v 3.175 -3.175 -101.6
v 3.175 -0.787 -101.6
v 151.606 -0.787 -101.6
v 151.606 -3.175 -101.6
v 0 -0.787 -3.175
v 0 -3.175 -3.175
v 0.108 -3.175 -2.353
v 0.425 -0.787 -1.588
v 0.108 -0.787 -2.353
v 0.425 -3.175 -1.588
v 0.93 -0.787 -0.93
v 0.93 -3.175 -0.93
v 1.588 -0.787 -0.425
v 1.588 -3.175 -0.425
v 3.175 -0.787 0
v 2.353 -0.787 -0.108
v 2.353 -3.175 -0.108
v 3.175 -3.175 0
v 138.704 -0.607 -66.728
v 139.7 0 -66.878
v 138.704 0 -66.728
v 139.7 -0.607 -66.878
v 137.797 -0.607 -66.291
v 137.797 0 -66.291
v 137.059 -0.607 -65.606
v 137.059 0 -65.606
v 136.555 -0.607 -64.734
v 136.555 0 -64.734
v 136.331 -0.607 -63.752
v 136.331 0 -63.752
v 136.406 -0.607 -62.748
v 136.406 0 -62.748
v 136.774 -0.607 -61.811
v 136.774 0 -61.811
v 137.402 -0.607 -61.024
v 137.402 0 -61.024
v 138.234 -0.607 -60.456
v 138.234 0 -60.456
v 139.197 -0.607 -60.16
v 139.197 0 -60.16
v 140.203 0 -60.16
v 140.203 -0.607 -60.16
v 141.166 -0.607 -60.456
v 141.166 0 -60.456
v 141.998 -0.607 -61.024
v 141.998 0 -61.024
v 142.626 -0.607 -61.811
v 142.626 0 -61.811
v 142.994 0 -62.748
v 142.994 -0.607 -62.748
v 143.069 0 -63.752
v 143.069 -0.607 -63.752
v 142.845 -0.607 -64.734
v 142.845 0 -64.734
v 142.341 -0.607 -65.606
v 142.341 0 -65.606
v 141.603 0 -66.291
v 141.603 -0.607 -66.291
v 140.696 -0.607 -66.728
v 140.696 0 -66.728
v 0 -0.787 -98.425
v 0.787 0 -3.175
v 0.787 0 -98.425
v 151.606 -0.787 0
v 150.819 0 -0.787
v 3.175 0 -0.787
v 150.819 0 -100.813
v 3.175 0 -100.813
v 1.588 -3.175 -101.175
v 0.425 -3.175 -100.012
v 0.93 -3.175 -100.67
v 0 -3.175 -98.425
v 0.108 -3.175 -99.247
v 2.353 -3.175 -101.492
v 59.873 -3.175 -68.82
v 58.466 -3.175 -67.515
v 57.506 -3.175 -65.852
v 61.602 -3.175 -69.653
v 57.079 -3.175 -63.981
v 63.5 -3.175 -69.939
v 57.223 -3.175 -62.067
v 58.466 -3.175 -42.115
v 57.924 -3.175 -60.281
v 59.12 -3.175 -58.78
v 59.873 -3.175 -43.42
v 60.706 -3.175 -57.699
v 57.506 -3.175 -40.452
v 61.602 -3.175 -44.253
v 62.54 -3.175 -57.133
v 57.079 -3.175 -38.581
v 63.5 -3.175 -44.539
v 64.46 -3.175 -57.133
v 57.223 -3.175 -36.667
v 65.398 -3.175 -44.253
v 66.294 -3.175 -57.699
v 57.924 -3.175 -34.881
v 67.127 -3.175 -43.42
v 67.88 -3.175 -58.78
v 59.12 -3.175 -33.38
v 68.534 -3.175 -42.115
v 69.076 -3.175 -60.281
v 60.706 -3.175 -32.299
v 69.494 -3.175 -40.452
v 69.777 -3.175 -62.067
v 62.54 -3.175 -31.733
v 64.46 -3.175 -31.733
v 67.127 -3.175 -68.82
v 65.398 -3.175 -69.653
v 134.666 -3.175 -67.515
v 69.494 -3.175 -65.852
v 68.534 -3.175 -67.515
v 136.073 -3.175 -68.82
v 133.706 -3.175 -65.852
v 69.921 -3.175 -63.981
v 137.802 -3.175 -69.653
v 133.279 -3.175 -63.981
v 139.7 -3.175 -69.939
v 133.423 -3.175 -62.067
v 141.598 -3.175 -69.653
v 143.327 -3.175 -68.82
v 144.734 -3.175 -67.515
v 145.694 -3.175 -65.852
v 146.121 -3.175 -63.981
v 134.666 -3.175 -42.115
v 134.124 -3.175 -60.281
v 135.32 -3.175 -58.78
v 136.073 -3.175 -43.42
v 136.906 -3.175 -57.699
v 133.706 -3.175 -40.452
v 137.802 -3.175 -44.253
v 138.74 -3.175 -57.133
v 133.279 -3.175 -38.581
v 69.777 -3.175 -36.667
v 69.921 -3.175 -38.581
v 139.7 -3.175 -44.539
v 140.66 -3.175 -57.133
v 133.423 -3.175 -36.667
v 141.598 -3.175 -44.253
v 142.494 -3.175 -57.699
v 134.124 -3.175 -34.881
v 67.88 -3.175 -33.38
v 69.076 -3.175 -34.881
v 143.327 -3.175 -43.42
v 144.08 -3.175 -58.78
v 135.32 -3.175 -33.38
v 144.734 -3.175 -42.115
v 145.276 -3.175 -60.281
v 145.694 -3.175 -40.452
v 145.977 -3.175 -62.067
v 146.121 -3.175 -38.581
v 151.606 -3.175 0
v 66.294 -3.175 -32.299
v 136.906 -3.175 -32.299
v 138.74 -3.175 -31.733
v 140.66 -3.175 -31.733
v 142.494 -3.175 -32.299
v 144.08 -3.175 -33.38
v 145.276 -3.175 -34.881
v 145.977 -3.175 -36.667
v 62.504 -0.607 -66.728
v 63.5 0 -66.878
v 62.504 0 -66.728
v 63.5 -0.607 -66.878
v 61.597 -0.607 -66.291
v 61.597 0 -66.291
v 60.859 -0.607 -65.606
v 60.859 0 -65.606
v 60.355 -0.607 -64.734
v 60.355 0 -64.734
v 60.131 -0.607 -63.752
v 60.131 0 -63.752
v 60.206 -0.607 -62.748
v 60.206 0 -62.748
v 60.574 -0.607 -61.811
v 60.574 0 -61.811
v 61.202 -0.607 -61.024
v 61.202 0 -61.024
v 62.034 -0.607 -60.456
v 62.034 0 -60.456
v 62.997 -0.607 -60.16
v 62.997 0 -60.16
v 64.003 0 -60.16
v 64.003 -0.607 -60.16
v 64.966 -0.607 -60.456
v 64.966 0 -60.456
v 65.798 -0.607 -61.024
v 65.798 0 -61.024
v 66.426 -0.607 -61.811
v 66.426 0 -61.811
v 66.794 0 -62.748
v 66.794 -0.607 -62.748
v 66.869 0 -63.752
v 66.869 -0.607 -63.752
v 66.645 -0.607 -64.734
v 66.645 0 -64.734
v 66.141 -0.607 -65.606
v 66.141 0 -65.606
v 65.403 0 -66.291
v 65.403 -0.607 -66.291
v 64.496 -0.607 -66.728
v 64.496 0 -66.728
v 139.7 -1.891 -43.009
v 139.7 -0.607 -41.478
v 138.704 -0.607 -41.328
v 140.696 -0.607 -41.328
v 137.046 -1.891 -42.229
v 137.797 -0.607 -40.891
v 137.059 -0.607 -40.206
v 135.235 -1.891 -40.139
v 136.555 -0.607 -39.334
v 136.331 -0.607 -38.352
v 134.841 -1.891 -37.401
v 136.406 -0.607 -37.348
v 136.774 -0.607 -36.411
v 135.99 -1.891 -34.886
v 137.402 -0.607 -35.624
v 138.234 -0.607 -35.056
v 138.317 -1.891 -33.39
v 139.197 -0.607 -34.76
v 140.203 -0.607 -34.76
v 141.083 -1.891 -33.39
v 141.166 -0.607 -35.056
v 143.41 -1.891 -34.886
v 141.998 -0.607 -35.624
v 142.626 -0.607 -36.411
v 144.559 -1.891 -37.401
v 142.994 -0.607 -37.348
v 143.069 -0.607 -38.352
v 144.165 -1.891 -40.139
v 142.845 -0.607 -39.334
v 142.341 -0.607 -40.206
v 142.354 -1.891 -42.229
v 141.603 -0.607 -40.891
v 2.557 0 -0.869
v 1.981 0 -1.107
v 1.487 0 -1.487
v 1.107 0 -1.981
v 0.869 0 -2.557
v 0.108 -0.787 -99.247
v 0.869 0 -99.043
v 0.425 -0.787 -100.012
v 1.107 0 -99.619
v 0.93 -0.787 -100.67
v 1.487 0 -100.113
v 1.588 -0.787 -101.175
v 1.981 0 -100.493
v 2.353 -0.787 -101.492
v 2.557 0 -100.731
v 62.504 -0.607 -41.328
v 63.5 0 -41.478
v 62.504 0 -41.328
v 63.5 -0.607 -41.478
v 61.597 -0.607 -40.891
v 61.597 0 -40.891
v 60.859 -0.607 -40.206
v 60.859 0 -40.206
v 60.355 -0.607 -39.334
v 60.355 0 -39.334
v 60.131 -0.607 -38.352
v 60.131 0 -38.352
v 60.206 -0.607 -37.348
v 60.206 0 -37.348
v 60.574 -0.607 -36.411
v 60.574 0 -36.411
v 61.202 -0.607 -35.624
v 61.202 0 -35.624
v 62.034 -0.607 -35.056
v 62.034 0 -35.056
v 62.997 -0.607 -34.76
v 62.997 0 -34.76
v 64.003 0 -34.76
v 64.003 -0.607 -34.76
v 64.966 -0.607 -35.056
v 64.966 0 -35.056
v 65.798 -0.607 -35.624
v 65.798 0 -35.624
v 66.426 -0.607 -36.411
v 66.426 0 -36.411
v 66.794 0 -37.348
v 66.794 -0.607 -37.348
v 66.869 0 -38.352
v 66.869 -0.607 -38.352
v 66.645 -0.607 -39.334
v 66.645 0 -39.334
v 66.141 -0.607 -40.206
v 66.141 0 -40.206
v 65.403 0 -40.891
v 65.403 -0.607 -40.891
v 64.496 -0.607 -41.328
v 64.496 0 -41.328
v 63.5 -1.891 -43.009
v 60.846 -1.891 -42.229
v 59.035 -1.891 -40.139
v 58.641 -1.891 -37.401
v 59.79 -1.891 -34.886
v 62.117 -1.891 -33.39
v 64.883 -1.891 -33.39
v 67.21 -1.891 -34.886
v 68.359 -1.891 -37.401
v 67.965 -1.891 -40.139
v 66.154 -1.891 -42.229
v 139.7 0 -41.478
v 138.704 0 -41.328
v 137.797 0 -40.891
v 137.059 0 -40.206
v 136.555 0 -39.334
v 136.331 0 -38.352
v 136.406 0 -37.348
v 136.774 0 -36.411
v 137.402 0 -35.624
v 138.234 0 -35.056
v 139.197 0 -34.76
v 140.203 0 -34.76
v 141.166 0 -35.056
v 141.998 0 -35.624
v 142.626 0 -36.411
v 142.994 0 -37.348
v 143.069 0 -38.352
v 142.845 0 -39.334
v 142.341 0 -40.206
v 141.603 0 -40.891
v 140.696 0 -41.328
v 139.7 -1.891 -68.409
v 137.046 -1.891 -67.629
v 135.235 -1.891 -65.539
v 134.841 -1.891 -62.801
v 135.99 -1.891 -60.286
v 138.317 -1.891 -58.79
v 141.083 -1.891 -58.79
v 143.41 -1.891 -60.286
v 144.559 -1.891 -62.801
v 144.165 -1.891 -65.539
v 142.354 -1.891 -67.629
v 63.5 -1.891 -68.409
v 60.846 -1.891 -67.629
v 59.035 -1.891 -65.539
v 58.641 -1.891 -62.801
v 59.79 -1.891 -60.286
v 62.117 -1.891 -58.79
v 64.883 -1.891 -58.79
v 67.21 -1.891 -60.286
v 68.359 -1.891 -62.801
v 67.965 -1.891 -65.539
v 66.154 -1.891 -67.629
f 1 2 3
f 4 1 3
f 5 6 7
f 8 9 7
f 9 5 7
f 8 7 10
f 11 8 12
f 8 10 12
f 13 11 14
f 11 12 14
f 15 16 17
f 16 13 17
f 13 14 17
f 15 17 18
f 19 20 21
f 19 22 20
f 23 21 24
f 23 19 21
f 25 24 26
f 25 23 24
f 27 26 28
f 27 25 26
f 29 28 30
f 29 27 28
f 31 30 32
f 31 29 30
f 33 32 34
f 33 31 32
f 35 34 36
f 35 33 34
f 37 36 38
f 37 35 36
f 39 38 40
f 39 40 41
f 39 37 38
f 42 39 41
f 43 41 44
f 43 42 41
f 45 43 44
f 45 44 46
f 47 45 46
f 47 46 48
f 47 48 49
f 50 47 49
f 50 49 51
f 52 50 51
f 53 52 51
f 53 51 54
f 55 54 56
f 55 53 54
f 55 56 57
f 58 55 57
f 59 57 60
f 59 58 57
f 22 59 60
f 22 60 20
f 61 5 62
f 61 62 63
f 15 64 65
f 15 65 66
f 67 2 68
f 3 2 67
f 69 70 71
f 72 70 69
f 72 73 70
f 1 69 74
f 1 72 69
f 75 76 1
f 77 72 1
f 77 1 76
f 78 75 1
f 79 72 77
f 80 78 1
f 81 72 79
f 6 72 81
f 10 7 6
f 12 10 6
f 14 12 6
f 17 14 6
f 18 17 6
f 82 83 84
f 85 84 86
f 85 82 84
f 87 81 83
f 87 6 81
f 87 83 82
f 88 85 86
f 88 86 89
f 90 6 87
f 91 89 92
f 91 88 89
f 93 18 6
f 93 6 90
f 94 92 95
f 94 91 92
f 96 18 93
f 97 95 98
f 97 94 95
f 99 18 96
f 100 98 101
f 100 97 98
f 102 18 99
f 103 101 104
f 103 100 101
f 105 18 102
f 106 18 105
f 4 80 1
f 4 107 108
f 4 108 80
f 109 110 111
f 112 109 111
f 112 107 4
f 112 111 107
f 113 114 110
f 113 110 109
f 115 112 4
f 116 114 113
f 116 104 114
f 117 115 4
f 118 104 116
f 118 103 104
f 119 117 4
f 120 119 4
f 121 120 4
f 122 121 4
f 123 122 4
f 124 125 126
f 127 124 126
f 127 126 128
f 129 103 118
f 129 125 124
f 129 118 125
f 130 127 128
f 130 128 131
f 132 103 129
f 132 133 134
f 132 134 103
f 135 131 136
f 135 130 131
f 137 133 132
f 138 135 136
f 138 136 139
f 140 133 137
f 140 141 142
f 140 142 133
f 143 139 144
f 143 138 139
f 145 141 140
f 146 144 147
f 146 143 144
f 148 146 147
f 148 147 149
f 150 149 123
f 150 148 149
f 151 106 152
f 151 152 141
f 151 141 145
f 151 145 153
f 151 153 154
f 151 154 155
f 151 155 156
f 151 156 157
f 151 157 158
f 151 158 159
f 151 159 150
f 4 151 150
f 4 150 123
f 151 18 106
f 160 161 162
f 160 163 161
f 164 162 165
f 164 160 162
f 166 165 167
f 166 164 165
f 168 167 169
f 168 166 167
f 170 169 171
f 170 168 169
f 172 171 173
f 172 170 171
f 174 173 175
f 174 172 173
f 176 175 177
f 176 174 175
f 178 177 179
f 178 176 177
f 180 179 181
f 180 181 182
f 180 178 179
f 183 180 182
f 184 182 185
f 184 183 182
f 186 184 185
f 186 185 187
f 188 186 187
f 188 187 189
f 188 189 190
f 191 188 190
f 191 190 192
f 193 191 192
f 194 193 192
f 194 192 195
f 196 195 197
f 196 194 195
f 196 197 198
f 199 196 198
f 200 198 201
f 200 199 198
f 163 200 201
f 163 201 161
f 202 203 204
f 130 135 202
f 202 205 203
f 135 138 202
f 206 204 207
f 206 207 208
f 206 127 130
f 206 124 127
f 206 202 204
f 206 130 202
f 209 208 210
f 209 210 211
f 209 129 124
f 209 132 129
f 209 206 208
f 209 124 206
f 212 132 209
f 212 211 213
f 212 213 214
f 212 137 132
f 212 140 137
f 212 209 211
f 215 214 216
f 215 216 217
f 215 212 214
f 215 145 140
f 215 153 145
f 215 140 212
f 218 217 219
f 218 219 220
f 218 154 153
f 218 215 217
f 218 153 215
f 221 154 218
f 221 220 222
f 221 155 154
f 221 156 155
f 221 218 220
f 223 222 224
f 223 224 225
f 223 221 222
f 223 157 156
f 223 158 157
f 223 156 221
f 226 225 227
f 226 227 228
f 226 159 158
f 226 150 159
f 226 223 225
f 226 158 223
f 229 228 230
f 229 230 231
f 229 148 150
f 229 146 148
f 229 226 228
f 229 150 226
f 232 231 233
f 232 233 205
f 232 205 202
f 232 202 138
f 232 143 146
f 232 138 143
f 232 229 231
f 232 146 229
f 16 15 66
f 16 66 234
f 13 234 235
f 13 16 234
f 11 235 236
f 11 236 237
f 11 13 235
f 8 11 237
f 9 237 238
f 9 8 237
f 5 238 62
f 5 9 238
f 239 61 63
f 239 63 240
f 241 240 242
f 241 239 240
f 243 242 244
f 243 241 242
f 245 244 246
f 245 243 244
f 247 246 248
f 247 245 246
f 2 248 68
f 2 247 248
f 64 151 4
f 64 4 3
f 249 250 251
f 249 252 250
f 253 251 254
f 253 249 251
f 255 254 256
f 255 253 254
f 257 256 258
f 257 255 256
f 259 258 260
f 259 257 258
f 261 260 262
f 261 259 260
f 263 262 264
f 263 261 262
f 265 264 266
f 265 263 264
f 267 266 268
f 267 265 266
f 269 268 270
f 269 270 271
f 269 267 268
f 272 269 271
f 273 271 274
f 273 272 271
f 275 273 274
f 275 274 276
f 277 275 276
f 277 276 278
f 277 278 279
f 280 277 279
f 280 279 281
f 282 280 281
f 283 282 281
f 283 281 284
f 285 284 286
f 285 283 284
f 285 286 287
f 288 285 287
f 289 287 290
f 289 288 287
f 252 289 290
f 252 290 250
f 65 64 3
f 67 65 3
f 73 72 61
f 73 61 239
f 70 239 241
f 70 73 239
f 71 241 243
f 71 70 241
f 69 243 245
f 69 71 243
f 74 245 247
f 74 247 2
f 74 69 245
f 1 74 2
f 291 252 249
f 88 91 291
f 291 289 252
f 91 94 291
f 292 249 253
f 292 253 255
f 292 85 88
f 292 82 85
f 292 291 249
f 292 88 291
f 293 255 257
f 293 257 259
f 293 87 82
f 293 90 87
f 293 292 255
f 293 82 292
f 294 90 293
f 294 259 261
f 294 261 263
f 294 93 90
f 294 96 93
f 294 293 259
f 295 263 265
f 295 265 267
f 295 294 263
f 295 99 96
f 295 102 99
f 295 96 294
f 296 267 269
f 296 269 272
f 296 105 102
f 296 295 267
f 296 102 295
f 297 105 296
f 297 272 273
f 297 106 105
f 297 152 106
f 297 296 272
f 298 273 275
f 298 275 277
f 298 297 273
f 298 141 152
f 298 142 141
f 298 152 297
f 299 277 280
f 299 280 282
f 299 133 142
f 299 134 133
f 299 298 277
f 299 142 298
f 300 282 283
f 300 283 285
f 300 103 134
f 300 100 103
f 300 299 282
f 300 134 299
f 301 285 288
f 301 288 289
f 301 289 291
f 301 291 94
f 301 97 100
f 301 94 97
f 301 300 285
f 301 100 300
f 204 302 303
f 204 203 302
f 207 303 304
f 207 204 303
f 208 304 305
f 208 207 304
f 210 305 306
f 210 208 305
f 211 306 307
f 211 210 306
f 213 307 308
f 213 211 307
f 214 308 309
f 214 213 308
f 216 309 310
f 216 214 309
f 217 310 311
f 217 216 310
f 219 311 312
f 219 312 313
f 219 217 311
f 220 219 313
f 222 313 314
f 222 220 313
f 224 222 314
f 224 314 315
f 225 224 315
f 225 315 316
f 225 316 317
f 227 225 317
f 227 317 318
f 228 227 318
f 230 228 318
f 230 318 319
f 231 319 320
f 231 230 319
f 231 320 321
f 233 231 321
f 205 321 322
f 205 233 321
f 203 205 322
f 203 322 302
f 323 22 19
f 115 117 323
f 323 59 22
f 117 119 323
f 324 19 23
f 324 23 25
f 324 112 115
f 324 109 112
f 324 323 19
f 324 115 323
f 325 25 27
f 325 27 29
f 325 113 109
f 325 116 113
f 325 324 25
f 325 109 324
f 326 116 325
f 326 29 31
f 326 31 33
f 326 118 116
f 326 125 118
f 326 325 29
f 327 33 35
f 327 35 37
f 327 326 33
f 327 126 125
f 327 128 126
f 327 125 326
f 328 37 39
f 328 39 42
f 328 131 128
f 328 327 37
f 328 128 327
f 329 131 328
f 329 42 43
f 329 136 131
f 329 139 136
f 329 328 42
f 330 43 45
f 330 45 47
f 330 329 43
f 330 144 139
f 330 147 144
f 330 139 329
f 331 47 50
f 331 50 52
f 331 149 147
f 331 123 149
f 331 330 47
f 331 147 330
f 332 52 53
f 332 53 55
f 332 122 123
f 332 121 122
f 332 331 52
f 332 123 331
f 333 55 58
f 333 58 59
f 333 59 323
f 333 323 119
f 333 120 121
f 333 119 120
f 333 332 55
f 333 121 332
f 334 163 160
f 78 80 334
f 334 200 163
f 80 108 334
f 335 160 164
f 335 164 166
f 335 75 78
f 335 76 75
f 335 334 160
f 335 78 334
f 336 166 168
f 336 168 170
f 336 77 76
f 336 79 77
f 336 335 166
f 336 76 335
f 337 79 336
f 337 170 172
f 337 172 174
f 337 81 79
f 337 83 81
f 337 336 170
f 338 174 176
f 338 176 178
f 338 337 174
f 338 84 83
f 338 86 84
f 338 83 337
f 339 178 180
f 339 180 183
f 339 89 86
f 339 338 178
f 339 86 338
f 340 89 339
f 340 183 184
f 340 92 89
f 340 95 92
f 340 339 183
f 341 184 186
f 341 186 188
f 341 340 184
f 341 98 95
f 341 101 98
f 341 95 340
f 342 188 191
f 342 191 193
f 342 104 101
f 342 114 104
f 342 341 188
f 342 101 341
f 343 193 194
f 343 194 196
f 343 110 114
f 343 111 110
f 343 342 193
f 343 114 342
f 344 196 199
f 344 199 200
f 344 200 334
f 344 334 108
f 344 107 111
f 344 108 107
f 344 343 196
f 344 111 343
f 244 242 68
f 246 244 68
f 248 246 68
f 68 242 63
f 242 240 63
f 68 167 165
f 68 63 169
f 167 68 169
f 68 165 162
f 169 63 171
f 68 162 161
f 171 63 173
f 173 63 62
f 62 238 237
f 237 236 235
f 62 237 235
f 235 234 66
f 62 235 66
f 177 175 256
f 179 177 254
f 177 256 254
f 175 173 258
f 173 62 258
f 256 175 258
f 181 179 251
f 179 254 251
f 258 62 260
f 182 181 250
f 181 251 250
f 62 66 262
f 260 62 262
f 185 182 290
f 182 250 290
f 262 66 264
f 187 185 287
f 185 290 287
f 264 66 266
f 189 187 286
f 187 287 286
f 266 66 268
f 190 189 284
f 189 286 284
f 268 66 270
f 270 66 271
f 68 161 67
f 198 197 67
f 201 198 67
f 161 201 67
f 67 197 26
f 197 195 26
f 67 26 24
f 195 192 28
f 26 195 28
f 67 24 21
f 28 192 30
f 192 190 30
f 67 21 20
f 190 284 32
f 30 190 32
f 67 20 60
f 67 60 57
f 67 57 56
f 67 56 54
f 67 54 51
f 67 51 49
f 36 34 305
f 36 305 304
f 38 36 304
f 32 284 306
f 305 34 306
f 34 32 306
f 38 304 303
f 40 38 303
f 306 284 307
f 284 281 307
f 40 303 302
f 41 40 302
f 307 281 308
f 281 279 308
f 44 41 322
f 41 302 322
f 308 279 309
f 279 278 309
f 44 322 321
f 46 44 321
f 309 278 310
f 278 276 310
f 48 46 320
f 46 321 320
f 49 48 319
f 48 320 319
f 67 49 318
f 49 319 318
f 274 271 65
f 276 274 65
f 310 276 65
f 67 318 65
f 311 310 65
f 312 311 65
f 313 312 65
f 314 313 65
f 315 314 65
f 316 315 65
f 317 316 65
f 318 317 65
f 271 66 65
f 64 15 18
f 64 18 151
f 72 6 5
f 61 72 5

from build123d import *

# Parameters (mm, degrees)
SKETCH2_W                                   = 151.60625
SKETCH2_H                                   = 3.175
BOSS_EXTRUDE2_DEPTH                         = 101.6
CSK_FOR_1_4_FLAT_HEAD_MACHINE_SCREW_2_COUNT = 2
CSK_FOR_1_4_FLAT_HEAD_MACHINE_SCREW_2_PITCH = 25.4
CSK_FOR_1_4_FLAT_HEAD_MACHINE_SCREW_3_COUNT = 2
CSK_FOR_1_4_FLAT_HEAD_MACHINE_SCREW_3_PITCH = 80.321852568
CSK_FOR_1_4_FLAT_HEAD_MACHINE_SCREW_4_COUNT = 2
CSK_FOR_1_4_FLAT_HEAD_MACHINE_SCREW_4_PITCH = 76.2
CUT_EXTRUDE1_DEPTH                          = 4.175
CHAMFER1_SIZE                               = 0.7874


with BuildPart() as part:
    # Sketch2 → Boss-Extrude2 (new body)
    with BuildSketch(Plane.XY):
        with Locations((75.803125, -1.5875)):
            Rectangle(SKETCH2_W, SKETCH2_H)
    extrude(amount=-BOSS_EXTRUDE2_DEPTH)

    # Sketch4 → CSK for 1/4 Flat Head Machine Screw (100)1 (revolve, cut)
    with BuildSketch(Plane(origin=(63.5, -3.175, -38.1), x_dir=(0, 0, -1), z_dir=(1, 0, 0))):
        Polygon((0, 0), (0, 3.175), (3.3782, 3.175), (3.3782, 2.568232241), (6.4389, 0), align=None)
    csk_for_1_4_flat_head_machine_screw_100 = revolve(axis=Axis((63.5, -9.525, -38.1), (0, 1, 0)), mode=Mode.SUBTRACT)

    # CSK for 1_4 Flat Head Machine Screw  2: CSK for 1/4 Flat Head Machine Screw (100)1 ×2
    with Locations(*[(0, 0, -i * CSK_FOR_1_4_FLAT_HEAD_MACHINE_SCREW_2_PITCH) for i in range(1, CSK_FOR_1_4_FLAT_HEAD_MACHINE_SCREW_2_COUNT)]):
        add(csk_for_1_4_flat_head_machine_screw_100, mode=Mode.SUBTRACT)

    # CSK for 1_4 Flat Head Machine Screw  3: CSK for 1/4 Flat Head Machine Screw (100)1 ×2
    with Locations(*[Vector(0.948683298, 0, -0.316227766) * (i * CSK_FOR_1_4_FLAT_HEAD_MACHINE_SCREW_3_PITCH) for i in range(1, CSK_FOR_1_4_FLAT_HEAD_MACHINE_SCREW_3_COUNT)]):
        add(csk_for_1_4_flat_head_machine_screw_100, mode=Mode.SUBTRACT)

    # CSK for 1_4 Flat Head Machine Screw  4: CSK for 1/4 Flat Head Machine Screw (100)1 ×2
    with Locations(*[(i * CSK_FOR_1_4_FLAT_HEAD_MACHINE_SCREW_4_PITCH, 0, 0) for i in range(1, CSK_FOR_1_4_FLAT_HEAD_MACHINE_SCREW_4_COUNT)]):
        add(csk_for_1_4_flat_head_machine_screw_100, mode=Mode.SUBTRACT)

    # Sketch5 → Cut-Extrude1 (cut, through all)
    with BuildSketch(Plane.XZ.offset(3.175)):
        with BuildLine():
            Line((3.175, 0), (0, 0))
            Line((0, 0), (0, -3.175))
            ThreePointArc((0, -3.175), (0.92993597, -0.92993597), (3.175, 0))
        make_face()
        with BuildLine():
            Line((0, -101.6), (0, -98.425))
            ThreePointArc((0, -98.425), (0.92993597, -100.67006403), (3.175, -101.6))
            Line((3.175, -101.6), (0, -101.6))
        make_face()
    extrude(amount=-CUT_EXTRUDE1_DEPTH, mode=Mode.SUBTRACT)

    # Chamfer1
    chamfer1_edges = [part.edges().sort_by_distance(p)[0] for p in [
        (77.390625, 0, -101.6),
        (77.390625, 0, 0),
        (0, 0, -50.8),
        (0.92993597, 0, -0.92993597),
        (151.60625, 0, -50.8),
        (0.92993597, 0, -100.67006403),
    ]]
    chamfer(chamfer1_edges, length=CHAMFER1_SIZE)


solid = part.part
